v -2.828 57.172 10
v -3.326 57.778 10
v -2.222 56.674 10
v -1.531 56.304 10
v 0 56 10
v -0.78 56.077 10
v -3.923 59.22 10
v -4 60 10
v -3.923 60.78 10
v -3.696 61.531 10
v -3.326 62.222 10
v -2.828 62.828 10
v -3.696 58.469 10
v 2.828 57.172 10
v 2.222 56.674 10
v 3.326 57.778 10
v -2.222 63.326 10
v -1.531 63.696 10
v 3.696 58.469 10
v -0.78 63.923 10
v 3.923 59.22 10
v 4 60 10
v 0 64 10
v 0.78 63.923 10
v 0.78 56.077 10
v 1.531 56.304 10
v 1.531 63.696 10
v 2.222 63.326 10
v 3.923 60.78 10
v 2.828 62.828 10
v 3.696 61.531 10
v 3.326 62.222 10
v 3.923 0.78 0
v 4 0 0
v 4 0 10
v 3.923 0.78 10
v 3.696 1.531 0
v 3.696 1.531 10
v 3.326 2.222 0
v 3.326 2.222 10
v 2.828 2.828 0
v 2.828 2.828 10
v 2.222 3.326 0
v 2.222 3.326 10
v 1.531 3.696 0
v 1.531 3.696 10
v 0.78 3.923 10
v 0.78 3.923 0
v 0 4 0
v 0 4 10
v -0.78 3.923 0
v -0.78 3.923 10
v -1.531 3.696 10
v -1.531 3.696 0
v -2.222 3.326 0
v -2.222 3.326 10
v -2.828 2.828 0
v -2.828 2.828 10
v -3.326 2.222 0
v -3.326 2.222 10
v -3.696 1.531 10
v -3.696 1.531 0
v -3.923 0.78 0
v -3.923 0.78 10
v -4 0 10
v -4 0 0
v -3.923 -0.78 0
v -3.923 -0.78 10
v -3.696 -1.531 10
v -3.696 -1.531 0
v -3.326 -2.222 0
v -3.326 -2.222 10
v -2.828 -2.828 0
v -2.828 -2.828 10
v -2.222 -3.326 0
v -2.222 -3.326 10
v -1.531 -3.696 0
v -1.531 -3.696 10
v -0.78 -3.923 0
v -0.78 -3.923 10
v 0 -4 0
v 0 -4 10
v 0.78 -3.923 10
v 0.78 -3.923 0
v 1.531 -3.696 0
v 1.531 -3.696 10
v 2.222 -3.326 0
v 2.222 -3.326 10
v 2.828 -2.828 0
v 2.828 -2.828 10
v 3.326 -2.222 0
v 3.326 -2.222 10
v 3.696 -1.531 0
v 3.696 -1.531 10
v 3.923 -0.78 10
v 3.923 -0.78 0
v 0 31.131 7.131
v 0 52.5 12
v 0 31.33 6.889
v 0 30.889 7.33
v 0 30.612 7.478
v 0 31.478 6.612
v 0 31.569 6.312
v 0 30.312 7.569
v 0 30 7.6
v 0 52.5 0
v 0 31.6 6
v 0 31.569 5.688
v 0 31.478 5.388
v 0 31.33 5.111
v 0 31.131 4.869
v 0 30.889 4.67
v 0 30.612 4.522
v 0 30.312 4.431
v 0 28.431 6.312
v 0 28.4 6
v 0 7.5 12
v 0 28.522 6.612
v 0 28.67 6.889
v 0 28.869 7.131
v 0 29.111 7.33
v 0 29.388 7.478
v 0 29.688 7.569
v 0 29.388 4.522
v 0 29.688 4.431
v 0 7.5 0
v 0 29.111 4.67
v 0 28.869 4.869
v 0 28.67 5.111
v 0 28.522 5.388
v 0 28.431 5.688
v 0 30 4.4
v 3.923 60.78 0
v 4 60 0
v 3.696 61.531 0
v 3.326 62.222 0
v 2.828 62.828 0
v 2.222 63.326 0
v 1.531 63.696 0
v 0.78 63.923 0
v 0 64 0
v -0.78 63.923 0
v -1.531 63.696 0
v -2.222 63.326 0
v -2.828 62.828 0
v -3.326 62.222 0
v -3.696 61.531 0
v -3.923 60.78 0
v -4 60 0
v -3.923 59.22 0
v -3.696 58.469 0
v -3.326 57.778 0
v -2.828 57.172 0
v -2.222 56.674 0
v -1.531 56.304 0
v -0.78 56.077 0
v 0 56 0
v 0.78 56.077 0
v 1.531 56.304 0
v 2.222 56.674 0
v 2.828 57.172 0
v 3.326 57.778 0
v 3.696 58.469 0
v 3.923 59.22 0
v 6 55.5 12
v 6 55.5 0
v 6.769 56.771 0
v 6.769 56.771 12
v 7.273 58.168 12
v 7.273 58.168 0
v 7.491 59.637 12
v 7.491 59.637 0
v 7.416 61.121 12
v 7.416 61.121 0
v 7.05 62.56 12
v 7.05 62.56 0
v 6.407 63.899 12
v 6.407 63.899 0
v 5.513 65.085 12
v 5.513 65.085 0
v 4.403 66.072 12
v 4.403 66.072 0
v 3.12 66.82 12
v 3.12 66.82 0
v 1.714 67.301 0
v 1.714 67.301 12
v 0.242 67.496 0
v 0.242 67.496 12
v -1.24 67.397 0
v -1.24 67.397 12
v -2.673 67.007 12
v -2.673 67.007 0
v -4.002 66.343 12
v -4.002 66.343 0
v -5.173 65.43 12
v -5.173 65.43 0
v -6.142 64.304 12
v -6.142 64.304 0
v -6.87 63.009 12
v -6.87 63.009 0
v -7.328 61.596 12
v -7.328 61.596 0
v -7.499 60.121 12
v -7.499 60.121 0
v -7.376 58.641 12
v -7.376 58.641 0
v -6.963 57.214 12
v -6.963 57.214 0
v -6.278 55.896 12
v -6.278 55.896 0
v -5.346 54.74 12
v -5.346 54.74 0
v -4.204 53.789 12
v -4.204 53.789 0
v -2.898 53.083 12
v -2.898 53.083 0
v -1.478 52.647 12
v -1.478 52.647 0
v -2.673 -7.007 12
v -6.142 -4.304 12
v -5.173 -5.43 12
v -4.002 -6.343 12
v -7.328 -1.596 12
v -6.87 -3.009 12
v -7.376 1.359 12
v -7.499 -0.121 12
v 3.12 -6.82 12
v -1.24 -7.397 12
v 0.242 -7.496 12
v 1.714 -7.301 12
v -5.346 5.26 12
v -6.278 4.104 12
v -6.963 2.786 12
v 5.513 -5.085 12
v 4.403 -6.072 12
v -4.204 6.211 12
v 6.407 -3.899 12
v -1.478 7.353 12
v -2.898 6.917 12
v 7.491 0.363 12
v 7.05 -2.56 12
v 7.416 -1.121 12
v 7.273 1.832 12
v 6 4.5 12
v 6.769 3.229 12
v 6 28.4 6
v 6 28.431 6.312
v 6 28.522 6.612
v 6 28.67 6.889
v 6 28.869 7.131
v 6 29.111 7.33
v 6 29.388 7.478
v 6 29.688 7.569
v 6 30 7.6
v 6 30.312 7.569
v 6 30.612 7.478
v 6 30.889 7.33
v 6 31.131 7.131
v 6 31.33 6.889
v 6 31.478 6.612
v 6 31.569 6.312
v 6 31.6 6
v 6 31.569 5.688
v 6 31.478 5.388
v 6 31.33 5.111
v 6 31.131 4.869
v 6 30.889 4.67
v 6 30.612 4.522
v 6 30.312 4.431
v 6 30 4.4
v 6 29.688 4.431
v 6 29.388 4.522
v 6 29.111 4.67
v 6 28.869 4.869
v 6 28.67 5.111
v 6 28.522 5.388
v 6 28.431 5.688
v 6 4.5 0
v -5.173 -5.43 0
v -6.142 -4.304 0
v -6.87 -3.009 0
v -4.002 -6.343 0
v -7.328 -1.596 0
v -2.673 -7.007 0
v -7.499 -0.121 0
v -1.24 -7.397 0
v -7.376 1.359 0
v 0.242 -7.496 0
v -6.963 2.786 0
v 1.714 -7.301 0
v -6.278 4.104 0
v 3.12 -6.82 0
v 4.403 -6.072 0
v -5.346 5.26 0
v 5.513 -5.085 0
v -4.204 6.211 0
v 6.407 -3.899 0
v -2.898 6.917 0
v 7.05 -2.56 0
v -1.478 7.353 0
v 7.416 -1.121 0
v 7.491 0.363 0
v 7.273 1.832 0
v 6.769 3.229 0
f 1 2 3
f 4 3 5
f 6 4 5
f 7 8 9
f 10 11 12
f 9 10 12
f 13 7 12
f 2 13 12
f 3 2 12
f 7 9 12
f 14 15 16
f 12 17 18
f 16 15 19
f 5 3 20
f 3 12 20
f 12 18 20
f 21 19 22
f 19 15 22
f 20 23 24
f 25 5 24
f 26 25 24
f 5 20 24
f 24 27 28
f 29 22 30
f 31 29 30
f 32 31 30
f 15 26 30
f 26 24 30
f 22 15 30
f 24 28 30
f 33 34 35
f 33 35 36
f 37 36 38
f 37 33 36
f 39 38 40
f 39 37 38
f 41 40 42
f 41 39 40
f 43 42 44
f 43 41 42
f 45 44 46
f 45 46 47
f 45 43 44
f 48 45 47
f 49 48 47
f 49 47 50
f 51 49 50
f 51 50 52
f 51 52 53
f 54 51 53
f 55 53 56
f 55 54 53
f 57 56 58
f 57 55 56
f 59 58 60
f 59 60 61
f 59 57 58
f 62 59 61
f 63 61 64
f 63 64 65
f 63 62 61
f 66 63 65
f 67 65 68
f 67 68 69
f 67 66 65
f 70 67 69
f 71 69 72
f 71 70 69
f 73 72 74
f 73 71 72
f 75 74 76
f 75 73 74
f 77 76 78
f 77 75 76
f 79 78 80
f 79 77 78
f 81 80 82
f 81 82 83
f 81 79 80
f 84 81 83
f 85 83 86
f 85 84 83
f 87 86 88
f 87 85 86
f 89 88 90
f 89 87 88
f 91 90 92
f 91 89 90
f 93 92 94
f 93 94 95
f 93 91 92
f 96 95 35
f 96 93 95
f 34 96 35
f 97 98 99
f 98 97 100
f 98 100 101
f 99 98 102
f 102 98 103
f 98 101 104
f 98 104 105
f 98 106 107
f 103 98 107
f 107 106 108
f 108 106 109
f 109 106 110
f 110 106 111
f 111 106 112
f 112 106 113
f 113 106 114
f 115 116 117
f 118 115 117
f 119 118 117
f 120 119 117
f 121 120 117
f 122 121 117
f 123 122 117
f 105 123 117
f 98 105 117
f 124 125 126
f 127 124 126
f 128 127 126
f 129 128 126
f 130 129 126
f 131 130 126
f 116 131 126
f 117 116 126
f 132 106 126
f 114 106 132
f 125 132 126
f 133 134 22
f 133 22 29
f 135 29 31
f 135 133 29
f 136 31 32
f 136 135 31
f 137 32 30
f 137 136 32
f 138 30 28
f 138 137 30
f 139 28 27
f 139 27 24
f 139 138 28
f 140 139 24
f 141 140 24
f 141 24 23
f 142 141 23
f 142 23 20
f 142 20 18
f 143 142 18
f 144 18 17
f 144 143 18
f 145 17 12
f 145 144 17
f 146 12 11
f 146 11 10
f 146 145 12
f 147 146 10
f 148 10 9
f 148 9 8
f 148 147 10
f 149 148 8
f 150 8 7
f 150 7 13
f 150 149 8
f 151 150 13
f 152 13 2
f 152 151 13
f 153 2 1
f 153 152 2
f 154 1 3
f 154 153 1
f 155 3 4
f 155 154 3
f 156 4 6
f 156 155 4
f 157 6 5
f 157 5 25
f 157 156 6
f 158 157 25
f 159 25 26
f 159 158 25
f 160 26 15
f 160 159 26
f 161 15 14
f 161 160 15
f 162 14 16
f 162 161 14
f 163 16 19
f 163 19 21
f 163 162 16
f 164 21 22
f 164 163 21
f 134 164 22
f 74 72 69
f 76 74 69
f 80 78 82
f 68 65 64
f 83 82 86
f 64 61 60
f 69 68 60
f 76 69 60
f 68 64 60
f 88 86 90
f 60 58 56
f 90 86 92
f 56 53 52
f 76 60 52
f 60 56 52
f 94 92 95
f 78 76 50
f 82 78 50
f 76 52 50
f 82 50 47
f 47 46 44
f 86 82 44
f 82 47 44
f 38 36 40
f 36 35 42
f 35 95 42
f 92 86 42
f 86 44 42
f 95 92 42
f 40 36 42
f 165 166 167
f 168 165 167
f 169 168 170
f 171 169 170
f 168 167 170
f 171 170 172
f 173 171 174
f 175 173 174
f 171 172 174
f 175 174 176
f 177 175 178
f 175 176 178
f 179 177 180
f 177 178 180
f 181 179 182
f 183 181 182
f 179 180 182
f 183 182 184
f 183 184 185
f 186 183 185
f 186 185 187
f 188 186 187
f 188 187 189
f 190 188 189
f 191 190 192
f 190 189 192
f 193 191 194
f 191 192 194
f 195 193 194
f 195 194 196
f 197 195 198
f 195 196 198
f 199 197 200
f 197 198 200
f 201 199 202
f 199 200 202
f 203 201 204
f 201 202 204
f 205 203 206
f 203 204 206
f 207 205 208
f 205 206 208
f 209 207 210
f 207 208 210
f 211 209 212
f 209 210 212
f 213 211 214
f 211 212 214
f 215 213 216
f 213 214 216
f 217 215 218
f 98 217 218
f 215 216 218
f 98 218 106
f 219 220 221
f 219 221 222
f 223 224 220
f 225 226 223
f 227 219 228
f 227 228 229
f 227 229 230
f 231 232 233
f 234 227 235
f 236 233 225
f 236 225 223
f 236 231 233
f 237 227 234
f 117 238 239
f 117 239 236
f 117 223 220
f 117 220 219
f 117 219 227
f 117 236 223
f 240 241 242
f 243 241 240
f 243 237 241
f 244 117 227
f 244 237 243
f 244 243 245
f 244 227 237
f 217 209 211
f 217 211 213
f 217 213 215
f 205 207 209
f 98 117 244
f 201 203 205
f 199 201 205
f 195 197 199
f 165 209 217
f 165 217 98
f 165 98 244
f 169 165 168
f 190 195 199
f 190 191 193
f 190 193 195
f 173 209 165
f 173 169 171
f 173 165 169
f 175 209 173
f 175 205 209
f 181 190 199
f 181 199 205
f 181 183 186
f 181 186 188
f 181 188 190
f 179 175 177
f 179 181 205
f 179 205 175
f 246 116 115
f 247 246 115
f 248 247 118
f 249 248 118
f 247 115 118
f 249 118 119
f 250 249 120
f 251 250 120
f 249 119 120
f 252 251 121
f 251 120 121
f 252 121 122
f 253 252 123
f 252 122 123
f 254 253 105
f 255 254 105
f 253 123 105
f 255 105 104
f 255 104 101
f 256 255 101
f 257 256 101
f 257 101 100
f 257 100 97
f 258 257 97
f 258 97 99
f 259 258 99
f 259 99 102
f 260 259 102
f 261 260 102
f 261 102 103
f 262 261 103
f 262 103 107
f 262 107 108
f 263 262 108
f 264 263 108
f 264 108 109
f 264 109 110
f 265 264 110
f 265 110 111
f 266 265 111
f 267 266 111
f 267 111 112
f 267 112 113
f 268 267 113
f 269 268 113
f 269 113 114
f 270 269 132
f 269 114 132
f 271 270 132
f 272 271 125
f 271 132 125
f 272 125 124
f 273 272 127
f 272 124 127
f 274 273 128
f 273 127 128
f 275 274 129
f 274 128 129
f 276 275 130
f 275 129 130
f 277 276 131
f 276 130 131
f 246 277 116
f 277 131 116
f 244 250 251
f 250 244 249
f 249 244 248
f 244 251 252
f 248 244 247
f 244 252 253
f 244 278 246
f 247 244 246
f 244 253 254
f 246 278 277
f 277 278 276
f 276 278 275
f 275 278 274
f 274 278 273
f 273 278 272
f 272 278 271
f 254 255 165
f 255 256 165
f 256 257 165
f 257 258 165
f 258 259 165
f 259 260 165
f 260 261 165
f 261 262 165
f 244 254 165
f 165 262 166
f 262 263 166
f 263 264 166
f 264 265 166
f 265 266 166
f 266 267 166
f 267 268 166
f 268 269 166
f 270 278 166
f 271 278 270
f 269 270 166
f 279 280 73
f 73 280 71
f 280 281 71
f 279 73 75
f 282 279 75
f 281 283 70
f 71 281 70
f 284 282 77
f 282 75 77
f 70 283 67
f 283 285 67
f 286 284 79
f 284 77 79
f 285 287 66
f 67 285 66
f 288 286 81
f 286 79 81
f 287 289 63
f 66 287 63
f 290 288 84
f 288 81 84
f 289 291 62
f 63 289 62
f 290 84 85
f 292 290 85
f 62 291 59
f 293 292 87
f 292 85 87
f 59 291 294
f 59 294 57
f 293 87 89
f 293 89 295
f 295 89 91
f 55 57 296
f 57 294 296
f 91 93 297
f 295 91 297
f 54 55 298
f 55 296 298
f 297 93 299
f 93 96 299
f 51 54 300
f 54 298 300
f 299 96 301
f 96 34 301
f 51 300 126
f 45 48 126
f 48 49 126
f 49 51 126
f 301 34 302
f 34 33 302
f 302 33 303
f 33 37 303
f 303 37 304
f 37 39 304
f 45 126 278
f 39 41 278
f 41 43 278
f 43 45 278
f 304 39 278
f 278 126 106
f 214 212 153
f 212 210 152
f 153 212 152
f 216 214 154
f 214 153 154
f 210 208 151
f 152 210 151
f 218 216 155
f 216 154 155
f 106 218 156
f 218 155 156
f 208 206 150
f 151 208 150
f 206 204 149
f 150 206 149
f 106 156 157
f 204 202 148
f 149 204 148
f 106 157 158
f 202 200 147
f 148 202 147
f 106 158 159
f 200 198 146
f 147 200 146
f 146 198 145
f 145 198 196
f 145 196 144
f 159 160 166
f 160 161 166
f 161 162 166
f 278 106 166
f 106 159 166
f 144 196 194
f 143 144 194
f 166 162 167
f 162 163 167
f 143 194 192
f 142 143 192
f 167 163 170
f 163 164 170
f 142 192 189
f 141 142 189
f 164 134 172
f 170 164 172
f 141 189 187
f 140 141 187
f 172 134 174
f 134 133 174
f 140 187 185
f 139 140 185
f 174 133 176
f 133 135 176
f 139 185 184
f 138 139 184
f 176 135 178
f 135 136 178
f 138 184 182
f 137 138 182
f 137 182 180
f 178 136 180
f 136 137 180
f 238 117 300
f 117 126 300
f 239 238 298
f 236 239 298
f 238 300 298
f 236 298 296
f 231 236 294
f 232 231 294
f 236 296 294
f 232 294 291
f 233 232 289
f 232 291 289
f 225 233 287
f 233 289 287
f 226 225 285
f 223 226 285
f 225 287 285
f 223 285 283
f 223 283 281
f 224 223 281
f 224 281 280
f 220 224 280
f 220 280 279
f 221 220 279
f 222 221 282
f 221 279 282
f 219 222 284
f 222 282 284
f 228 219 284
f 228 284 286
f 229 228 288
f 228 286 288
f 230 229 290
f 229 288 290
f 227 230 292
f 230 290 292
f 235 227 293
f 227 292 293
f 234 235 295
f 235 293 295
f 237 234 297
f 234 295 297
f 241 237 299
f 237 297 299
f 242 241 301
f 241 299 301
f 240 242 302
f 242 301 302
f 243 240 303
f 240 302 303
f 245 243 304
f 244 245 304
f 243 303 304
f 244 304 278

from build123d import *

# Parameters (mm, degrees)
ESBO_O1_R                = 4
RESSALTO_EXTRUS_O1_DEPTH = 10
RESSALTO_EXTRUS_O2_DEPTH = 2
ESBO_O2_R                = 1.6
CORTE_EXTRUS_O1_DEPTH    = 10


with BuildPart() as part:
    # Esboço1 → Ressalto-extrusão1 (new body)
    with BuildSketch(Plane.XY):
        with BuildLine():
            Line((6, 4.5), (6, 55.5))
            ThreePointArc((6, 55.5), (-3.354101966, 66.708203932), (0, 52.5))
            Line((0, 52.5), (0, 7.5))
            ThreePointArc((0, 7.5), (-3.354101966, -6.708203932), (6, 4.5))
        make_face()
        Circle(ESBO_O1_R, mode=Mode.SUBTRACT)
        with Locations((0, 60)):
            Circle(ESBO_O1_R, mode=Mode.SUBTRACT)
    extrude(amount=RESSALTO_EXTRUS_O1_DEPTH)

    # Esboço3 → Ressalto-extrusão2 (add)
    with BuildSketch(Plane.XY.offset(10)):
        with BuildLine():
            Line((0, 52.5), (0, 7.5))
            ThreePointArc((0, 7.5), (-3.354101966, -6.708203932), (6, 4.5))
            Line((6, 4.5), (6, 55.5))
            ThreePointArc((6, 55.5), (-3.354101966, 66.708203932), (0, 52.5))
        make_face()
    extrude(amount=RESSALTO_EXTRUS_O2_DEPTH)

    # Esboço2 → Corte-extrusão1 (cut)
    with BuildSketch(Plane.ZY):
        with Locations(Location((6, 30, 0), (0, 0, 270))):
            Circle(ESBO_O2_R)
    extrude(amount=-CORTE_EXTRUS_O1_DEPTH, mode=Mode.SUBTRACT)


solid = part.part
